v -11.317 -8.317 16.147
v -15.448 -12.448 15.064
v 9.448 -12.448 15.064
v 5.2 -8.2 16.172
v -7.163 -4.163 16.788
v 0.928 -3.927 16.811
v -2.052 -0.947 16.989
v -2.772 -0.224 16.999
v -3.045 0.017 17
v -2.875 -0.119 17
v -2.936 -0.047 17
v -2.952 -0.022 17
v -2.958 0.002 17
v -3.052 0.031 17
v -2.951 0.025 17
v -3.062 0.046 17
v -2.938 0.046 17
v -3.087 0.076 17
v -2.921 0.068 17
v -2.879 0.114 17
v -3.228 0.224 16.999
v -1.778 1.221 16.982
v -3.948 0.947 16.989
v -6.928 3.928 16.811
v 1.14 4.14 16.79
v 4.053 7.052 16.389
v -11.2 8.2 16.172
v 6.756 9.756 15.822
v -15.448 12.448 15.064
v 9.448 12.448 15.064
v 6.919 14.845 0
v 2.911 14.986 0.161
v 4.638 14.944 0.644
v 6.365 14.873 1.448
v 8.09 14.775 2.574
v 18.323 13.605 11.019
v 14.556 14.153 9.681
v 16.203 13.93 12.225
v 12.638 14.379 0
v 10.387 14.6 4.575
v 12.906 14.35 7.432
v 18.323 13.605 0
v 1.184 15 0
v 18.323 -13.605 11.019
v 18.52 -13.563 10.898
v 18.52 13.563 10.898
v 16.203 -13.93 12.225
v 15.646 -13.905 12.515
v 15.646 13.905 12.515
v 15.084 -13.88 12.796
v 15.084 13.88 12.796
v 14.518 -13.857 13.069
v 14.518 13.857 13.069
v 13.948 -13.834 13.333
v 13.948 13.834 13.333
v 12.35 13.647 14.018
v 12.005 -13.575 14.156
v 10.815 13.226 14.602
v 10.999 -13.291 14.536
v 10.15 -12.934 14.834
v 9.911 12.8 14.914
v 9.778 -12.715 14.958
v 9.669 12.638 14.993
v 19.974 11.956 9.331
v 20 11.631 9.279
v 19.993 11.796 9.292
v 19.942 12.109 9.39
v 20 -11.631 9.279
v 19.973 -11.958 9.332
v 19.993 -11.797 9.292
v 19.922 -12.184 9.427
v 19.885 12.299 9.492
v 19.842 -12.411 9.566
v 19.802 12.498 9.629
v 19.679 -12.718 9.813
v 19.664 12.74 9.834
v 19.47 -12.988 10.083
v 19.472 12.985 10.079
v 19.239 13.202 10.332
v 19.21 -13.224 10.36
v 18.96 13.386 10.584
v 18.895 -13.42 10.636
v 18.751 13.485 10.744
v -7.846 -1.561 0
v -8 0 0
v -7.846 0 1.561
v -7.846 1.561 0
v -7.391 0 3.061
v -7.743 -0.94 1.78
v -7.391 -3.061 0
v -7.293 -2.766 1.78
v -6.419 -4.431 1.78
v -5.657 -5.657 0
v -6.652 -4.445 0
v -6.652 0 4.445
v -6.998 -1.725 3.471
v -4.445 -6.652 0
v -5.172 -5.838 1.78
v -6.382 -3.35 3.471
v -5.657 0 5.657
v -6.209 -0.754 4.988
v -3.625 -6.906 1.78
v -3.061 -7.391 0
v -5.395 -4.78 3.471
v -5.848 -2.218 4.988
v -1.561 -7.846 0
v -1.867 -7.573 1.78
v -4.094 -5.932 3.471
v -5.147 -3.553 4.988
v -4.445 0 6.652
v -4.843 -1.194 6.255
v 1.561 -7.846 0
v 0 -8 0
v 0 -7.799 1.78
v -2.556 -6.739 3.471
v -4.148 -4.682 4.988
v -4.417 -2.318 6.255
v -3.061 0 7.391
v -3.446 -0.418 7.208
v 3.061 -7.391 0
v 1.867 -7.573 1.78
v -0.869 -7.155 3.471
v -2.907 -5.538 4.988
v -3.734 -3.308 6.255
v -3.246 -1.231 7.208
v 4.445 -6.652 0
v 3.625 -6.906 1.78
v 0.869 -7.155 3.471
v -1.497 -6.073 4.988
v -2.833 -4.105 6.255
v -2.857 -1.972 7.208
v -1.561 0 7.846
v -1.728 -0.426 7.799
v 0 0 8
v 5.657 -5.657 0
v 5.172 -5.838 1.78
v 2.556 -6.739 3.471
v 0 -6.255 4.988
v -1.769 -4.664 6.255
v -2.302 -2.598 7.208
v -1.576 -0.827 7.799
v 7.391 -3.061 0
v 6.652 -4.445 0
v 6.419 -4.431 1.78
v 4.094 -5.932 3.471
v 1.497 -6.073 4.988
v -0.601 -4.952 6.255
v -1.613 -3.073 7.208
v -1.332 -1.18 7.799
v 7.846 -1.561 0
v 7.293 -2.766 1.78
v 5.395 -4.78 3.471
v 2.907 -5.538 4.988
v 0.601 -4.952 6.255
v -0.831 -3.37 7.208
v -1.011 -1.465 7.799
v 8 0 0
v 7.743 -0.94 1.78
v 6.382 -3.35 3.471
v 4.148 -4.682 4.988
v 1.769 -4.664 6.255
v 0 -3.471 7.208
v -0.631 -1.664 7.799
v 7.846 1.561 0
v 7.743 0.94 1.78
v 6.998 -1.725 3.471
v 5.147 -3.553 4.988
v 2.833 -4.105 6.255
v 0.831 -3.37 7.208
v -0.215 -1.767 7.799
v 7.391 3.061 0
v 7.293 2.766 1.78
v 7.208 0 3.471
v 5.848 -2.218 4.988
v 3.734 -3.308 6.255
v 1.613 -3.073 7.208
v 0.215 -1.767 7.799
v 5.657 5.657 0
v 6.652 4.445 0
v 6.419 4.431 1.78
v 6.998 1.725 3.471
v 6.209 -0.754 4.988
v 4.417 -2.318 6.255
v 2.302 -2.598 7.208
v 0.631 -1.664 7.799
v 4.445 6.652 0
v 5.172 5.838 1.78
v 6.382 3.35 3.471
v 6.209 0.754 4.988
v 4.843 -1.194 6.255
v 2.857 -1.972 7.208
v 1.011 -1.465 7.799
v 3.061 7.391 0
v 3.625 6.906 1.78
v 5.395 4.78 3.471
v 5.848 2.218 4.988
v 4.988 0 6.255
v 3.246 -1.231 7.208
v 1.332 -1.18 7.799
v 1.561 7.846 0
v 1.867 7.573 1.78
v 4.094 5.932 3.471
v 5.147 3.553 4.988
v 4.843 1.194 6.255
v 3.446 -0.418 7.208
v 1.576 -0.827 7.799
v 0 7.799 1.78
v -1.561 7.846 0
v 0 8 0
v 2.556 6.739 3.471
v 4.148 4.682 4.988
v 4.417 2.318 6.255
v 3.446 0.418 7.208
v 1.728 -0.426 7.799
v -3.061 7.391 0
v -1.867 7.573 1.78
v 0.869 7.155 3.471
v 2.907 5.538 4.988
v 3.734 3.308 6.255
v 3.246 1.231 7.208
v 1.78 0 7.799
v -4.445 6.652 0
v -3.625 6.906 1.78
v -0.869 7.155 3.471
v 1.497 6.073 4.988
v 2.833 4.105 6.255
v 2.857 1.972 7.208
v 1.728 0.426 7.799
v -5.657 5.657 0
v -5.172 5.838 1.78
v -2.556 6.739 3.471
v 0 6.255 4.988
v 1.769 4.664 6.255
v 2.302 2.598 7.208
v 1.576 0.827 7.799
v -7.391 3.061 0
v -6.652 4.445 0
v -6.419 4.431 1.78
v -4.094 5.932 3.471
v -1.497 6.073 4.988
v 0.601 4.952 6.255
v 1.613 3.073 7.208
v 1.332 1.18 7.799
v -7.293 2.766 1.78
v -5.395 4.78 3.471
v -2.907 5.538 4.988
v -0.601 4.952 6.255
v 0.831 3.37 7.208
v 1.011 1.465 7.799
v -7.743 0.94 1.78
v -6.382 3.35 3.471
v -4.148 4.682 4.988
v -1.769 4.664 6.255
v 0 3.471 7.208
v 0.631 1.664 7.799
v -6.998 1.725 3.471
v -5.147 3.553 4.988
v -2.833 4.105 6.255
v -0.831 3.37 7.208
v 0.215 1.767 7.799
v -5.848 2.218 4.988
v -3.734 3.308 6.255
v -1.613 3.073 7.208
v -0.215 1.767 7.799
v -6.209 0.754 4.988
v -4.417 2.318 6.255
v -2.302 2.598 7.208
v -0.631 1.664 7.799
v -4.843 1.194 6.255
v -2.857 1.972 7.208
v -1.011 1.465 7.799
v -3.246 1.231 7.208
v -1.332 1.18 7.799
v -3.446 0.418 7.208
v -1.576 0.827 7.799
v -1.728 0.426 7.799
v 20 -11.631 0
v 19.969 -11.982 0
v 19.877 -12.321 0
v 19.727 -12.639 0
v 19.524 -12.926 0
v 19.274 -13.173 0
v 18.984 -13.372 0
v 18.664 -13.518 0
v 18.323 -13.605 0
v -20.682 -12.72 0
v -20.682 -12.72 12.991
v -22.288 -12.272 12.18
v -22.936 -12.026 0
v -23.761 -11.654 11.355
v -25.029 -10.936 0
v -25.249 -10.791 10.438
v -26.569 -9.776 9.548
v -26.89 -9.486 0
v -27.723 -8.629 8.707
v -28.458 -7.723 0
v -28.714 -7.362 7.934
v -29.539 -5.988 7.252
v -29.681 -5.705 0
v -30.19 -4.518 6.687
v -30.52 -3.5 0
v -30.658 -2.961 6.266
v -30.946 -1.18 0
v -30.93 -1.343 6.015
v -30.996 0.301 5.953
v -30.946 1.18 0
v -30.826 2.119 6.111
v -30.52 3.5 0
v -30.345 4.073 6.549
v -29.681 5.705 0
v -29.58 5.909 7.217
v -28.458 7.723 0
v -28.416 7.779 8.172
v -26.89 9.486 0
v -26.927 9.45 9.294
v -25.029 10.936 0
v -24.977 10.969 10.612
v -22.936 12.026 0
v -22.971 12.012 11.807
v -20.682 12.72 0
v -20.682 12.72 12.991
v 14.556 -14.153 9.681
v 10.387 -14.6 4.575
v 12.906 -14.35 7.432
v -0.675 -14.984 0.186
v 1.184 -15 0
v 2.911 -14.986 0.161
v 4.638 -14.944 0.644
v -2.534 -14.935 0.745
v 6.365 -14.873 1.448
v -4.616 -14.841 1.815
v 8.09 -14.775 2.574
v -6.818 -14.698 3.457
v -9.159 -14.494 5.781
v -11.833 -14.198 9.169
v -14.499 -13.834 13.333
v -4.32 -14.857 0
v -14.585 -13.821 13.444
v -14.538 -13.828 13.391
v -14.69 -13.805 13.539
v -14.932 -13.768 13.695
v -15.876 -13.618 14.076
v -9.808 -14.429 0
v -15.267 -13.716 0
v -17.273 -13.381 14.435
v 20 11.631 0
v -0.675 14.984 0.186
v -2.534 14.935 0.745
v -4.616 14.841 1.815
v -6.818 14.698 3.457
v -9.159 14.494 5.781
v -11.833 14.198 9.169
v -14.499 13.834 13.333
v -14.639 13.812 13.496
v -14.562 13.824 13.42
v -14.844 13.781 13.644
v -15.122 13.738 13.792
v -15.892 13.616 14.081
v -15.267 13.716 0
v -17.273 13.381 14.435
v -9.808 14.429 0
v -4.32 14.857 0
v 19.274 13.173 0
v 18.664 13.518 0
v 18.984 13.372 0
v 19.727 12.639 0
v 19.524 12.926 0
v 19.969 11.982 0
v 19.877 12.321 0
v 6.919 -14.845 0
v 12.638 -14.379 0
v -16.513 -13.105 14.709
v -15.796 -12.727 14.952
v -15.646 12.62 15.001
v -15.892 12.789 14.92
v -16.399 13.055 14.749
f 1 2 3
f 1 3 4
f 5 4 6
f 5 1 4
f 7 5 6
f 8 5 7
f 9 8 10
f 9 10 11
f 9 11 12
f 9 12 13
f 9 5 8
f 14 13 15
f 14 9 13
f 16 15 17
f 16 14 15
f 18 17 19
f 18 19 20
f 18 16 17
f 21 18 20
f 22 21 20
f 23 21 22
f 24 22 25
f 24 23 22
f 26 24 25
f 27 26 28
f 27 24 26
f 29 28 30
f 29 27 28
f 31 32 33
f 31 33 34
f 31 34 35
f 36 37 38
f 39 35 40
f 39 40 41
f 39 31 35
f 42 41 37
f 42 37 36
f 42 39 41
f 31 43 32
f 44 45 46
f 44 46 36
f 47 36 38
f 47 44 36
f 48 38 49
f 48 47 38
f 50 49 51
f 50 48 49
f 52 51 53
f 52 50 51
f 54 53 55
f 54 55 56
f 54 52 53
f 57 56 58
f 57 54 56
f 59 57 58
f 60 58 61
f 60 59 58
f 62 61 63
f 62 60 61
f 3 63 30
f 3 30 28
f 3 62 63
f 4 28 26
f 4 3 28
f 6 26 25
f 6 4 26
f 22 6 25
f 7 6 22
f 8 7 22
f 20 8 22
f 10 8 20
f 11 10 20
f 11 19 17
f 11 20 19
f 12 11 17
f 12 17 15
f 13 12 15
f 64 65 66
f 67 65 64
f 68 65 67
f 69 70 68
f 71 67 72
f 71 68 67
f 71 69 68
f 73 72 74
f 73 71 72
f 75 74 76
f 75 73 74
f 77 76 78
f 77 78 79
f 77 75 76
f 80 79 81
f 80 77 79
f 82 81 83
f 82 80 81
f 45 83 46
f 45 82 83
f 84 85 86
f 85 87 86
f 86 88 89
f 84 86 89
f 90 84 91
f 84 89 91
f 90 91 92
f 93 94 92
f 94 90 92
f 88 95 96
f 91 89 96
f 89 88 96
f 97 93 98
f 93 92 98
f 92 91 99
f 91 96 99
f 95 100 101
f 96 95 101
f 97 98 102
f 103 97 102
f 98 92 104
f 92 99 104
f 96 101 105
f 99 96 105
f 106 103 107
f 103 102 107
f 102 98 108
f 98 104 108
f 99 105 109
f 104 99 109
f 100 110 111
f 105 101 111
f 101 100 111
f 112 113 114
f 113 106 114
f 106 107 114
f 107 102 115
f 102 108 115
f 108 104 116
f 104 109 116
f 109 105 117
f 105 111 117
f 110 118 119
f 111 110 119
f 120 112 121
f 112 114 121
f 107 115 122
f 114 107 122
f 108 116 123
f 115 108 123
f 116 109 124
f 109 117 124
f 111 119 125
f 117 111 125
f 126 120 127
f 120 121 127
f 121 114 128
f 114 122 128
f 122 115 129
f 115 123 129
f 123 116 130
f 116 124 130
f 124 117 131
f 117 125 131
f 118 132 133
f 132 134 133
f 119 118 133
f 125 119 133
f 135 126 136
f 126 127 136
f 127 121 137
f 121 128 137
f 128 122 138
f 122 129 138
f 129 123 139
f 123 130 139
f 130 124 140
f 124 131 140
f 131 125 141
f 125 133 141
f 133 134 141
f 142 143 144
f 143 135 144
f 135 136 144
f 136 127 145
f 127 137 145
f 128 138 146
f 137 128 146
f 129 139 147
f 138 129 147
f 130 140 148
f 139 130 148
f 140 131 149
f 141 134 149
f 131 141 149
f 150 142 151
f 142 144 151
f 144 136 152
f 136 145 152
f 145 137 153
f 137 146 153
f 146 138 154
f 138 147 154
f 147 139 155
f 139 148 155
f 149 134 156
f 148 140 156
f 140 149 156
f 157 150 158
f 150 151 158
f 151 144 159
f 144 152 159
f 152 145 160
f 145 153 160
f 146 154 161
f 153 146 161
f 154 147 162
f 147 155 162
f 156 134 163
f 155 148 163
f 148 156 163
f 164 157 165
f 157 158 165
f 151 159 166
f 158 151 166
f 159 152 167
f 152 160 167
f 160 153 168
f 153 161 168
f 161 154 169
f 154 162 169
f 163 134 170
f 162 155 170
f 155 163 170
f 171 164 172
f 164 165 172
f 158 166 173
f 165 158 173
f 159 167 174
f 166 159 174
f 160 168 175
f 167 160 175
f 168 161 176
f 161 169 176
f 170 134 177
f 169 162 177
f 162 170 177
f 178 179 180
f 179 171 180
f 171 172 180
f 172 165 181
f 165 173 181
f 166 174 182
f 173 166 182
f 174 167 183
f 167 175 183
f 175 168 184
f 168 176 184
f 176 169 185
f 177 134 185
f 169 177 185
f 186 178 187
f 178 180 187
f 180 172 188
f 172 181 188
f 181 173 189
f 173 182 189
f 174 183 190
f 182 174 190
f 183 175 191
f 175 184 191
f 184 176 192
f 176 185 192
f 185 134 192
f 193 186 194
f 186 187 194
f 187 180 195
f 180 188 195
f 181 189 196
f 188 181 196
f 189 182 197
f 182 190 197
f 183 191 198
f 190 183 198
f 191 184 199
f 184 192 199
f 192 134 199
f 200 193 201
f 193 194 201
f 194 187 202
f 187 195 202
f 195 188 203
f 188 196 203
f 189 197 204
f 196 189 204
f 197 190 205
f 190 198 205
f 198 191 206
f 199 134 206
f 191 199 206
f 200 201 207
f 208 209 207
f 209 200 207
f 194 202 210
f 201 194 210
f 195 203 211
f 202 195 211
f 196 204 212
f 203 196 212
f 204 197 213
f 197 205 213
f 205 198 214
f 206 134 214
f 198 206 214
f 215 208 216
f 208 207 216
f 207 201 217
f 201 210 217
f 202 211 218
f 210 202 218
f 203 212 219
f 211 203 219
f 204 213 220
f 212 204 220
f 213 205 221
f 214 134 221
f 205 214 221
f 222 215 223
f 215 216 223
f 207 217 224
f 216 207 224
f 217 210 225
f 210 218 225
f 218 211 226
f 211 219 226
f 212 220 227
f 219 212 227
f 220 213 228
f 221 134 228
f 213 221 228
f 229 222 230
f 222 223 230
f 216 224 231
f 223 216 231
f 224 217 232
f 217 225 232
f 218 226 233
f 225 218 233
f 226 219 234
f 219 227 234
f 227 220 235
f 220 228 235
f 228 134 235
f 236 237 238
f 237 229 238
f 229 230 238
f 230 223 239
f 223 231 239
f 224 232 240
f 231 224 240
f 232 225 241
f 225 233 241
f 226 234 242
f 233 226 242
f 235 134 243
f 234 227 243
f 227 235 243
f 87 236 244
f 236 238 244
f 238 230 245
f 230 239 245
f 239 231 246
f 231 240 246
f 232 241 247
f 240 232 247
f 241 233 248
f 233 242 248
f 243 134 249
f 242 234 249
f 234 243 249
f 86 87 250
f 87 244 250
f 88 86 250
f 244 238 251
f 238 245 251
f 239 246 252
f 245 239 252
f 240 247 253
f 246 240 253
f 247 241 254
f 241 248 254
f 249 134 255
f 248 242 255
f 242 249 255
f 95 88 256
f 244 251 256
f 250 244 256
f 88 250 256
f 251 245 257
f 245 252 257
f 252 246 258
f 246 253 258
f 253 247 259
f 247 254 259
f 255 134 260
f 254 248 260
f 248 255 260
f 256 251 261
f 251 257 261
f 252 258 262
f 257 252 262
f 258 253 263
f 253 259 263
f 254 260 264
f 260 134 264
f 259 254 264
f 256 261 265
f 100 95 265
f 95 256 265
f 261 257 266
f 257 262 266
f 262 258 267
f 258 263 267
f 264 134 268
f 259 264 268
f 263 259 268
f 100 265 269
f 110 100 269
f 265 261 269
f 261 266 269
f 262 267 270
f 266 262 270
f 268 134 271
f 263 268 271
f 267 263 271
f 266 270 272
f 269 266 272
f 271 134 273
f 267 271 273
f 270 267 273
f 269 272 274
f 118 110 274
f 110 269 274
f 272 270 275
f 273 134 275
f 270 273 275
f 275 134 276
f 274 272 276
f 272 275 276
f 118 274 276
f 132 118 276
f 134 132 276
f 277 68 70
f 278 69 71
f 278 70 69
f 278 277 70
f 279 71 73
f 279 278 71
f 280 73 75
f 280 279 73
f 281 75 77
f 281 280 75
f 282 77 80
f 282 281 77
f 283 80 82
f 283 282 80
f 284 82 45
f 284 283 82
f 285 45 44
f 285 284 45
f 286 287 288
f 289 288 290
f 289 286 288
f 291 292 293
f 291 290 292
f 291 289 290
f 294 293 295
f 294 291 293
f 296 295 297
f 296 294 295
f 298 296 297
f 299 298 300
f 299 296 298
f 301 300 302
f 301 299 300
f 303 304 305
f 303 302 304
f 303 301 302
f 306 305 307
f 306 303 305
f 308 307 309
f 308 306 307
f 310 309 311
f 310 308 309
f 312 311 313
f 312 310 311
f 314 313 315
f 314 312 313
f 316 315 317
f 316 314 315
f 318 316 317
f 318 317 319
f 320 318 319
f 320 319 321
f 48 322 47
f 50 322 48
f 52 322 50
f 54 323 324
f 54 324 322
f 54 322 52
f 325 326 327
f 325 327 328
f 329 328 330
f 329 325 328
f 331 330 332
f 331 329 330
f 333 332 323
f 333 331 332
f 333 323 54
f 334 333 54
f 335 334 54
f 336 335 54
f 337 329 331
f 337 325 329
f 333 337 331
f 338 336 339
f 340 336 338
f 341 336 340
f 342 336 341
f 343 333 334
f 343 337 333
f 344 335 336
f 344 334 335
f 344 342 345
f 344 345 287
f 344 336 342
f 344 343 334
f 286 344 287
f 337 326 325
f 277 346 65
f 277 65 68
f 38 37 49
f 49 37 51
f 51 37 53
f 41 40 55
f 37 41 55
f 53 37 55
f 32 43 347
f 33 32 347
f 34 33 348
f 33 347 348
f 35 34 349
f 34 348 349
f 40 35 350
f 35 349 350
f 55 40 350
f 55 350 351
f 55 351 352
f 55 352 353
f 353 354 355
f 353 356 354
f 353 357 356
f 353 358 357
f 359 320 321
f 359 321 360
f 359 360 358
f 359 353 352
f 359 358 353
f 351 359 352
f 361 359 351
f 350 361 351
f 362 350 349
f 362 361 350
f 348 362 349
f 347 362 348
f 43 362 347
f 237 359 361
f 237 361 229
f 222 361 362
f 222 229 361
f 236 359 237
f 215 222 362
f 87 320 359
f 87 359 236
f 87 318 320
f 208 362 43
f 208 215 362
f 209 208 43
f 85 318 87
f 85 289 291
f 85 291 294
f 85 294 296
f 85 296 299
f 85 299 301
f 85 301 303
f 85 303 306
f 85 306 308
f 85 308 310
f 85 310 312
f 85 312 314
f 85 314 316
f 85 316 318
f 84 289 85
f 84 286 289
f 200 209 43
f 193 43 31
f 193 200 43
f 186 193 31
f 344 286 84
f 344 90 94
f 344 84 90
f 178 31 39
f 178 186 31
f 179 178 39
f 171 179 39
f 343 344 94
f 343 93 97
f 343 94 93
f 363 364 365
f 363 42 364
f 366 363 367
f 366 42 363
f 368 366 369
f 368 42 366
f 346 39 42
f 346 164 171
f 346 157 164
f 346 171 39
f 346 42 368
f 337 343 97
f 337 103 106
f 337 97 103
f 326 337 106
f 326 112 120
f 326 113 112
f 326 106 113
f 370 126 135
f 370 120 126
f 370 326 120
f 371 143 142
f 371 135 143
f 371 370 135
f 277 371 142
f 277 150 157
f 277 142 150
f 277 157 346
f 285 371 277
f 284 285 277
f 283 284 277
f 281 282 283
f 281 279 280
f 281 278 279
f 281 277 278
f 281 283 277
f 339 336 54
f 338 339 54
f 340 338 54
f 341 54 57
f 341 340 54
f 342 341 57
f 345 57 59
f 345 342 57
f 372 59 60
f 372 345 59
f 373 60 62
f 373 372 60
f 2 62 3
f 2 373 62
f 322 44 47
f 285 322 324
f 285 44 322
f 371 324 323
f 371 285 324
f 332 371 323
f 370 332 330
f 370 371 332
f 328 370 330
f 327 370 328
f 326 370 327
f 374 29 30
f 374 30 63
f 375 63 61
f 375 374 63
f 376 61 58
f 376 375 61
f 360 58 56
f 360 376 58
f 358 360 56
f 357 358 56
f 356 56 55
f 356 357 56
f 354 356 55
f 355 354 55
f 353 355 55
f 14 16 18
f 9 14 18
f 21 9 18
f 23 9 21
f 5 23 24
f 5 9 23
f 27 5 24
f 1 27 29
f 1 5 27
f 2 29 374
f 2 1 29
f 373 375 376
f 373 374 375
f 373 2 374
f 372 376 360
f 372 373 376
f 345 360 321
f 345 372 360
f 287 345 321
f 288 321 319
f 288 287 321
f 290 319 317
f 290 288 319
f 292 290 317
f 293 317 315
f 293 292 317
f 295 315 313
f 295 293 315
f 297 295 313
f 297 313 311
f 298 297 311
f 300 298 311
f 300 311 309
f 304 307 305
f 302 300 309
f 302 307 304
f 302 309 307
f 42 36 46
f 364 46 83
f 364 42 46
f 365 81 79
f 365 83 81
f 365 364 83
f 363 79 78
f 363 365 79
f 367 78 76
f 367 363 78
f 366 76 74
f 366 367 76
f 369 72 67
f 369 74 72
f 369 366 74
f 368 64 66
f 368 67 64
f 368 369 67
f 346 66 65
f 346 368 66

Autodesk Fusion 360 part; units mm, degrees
sketch "草图1" plane through (0, 0, 0) normal (0, 1, 0) x (1, 0, 0)
  line L0 (0, -55) -> (0, 50) construction
  line L1 (-125, 0) -> (125, 0) construction
  line L2 (-31, 0) -> (20, 0)
  circle A0 centre (20, -1) radius 1
  arc A1 (-31.065, -5.889) -> (18.5199, -10.8983) centre (-3, 24) ccw
  line L3 (-31.6884, -4.6053) -> (-31.9962, -1.0872)
  line L4 (20.4052, -7.8422) -> (20.9962, -1.0872)
  line L5 (21, 0) -> (21, -0.6) construction
  line L6 (-32, 0) -> (-32, -0.7) construction
  line L7 (0, -17) -> (10, -17) construction
  arc A2 (-31, 0) -> (-31.9962, -1.0872) centre (-31, -1) ccw
  arc A3 (-31.6884, -4.6053) -> (-31.065, -5.889) centre (-29.696, -4.431) ccw
  arc A4 (-8, 0) -> (8, 0) centre (0, 0) ccw
  arc A5 (18.5199, -10.8983) -> (20.4052, -7.8422) centre (16.4204, -7.4936) ccw
  line L8 (0, -8) -> (0, 0)
  dimension "d1" = 16
  dimension "d2" = 2
  dimension "d3" = 2
  dimension "d4" = 5
  dimension "d5" = 5
  dimension "d6" = 8
  dimension "d7" = 4
  dimension "d8" = 21
  dimension "d9" = 53
  dimension "d10" = 41
  dimension "d11" = 17
  dimension "d12" = 24
  dimension "d13" = 24
extrude "拉伸1" add sketch "草图1" along normal mid plane 30
revolve "旋转1" cut sketch "草图1" angle 360 about axis through (0, 0, 55) along (0, 0, -1) contours L2 A4 L8 picked at (-0.3795, -5.3062)
sketch "草图2" plane through (0, 0, 0) normal (0, 0, 1) x (1, 0, 0)
  line L0 (-31, -15) -> (20, -15)
  line L1 (20, 15) -> (-31, 15)
  arc A0 (18.3234, 13.6051) -> (-20.6815, 12.7204) centre (1.1833, -91) ccw
  arc A1 (-20.6815, -12.7204) -> (18.3234, -13.6051) centre (1.1833, 91) ccw
  line L2 (20, 11.6314) -> (20, -11.6314)
  arc A2 (20, 11.6314) -> (18.3234, 13.6051) centre (18, 11.6314) ccw
  arc A3 (18.3234, -13.6051) -> (20, -11.6314) centre (18, -11.6314) ccw
  arc A4 (-20.6815, 12.7204) -> (-20.6815, -12.7204) centre (-18, 0) ccw
  line L3 (-31, 15) -> (-31, -15) construction
  line L4 (-40, 0) -> (31, 0) construction
  dimension "d17" = 2
  dimension "d18" = 2
  dimension "d19" = 13
  dimension "d20" = 106
  dimension "d21" = 106
extrude "拉伸2" cut sketch "草图2" along normal blind 35 keep common part
sketch "草图3" plane through (0, 0, 0) normal (1, 0, 0) x (0, 1, 0)
  line L0 (-15, 0) -> (15, 0)
  line L1 (15, 0) -> (13.8335, 13.3333)
  line L2 (-15, 0) -> (-13.8335, 13.3333)
  line L3 (0, 45) -> (0, -20) construction
  line L4 (-40, 0) -> (40, 0) construction
  arc A0 (12.4483, 15.0645) -> (-12.4483, 15.0645) centre (0, -24) ccw
  arc A1 (-12.4483, 15.0645) -> (-13.8335, 13.3333) centre (-11.8411, 13.159) ccw
  arc A2 (13.8335, 13.3333) -> (12.4483, 15.0645) centre (11.8411, 13.159) ccw
  line L5 (0, 17) -> (10, 17) construction
  dimension "d24" = 10
  dimension "d25" = 30
  dimension "d26" = 4
  dimension "d27" = 4
  dimension "d28" = 41
  dimension "d29" = 17
extrude "拉伸3" cut sketch "草图3" along normal mid plane 100 keep common part
